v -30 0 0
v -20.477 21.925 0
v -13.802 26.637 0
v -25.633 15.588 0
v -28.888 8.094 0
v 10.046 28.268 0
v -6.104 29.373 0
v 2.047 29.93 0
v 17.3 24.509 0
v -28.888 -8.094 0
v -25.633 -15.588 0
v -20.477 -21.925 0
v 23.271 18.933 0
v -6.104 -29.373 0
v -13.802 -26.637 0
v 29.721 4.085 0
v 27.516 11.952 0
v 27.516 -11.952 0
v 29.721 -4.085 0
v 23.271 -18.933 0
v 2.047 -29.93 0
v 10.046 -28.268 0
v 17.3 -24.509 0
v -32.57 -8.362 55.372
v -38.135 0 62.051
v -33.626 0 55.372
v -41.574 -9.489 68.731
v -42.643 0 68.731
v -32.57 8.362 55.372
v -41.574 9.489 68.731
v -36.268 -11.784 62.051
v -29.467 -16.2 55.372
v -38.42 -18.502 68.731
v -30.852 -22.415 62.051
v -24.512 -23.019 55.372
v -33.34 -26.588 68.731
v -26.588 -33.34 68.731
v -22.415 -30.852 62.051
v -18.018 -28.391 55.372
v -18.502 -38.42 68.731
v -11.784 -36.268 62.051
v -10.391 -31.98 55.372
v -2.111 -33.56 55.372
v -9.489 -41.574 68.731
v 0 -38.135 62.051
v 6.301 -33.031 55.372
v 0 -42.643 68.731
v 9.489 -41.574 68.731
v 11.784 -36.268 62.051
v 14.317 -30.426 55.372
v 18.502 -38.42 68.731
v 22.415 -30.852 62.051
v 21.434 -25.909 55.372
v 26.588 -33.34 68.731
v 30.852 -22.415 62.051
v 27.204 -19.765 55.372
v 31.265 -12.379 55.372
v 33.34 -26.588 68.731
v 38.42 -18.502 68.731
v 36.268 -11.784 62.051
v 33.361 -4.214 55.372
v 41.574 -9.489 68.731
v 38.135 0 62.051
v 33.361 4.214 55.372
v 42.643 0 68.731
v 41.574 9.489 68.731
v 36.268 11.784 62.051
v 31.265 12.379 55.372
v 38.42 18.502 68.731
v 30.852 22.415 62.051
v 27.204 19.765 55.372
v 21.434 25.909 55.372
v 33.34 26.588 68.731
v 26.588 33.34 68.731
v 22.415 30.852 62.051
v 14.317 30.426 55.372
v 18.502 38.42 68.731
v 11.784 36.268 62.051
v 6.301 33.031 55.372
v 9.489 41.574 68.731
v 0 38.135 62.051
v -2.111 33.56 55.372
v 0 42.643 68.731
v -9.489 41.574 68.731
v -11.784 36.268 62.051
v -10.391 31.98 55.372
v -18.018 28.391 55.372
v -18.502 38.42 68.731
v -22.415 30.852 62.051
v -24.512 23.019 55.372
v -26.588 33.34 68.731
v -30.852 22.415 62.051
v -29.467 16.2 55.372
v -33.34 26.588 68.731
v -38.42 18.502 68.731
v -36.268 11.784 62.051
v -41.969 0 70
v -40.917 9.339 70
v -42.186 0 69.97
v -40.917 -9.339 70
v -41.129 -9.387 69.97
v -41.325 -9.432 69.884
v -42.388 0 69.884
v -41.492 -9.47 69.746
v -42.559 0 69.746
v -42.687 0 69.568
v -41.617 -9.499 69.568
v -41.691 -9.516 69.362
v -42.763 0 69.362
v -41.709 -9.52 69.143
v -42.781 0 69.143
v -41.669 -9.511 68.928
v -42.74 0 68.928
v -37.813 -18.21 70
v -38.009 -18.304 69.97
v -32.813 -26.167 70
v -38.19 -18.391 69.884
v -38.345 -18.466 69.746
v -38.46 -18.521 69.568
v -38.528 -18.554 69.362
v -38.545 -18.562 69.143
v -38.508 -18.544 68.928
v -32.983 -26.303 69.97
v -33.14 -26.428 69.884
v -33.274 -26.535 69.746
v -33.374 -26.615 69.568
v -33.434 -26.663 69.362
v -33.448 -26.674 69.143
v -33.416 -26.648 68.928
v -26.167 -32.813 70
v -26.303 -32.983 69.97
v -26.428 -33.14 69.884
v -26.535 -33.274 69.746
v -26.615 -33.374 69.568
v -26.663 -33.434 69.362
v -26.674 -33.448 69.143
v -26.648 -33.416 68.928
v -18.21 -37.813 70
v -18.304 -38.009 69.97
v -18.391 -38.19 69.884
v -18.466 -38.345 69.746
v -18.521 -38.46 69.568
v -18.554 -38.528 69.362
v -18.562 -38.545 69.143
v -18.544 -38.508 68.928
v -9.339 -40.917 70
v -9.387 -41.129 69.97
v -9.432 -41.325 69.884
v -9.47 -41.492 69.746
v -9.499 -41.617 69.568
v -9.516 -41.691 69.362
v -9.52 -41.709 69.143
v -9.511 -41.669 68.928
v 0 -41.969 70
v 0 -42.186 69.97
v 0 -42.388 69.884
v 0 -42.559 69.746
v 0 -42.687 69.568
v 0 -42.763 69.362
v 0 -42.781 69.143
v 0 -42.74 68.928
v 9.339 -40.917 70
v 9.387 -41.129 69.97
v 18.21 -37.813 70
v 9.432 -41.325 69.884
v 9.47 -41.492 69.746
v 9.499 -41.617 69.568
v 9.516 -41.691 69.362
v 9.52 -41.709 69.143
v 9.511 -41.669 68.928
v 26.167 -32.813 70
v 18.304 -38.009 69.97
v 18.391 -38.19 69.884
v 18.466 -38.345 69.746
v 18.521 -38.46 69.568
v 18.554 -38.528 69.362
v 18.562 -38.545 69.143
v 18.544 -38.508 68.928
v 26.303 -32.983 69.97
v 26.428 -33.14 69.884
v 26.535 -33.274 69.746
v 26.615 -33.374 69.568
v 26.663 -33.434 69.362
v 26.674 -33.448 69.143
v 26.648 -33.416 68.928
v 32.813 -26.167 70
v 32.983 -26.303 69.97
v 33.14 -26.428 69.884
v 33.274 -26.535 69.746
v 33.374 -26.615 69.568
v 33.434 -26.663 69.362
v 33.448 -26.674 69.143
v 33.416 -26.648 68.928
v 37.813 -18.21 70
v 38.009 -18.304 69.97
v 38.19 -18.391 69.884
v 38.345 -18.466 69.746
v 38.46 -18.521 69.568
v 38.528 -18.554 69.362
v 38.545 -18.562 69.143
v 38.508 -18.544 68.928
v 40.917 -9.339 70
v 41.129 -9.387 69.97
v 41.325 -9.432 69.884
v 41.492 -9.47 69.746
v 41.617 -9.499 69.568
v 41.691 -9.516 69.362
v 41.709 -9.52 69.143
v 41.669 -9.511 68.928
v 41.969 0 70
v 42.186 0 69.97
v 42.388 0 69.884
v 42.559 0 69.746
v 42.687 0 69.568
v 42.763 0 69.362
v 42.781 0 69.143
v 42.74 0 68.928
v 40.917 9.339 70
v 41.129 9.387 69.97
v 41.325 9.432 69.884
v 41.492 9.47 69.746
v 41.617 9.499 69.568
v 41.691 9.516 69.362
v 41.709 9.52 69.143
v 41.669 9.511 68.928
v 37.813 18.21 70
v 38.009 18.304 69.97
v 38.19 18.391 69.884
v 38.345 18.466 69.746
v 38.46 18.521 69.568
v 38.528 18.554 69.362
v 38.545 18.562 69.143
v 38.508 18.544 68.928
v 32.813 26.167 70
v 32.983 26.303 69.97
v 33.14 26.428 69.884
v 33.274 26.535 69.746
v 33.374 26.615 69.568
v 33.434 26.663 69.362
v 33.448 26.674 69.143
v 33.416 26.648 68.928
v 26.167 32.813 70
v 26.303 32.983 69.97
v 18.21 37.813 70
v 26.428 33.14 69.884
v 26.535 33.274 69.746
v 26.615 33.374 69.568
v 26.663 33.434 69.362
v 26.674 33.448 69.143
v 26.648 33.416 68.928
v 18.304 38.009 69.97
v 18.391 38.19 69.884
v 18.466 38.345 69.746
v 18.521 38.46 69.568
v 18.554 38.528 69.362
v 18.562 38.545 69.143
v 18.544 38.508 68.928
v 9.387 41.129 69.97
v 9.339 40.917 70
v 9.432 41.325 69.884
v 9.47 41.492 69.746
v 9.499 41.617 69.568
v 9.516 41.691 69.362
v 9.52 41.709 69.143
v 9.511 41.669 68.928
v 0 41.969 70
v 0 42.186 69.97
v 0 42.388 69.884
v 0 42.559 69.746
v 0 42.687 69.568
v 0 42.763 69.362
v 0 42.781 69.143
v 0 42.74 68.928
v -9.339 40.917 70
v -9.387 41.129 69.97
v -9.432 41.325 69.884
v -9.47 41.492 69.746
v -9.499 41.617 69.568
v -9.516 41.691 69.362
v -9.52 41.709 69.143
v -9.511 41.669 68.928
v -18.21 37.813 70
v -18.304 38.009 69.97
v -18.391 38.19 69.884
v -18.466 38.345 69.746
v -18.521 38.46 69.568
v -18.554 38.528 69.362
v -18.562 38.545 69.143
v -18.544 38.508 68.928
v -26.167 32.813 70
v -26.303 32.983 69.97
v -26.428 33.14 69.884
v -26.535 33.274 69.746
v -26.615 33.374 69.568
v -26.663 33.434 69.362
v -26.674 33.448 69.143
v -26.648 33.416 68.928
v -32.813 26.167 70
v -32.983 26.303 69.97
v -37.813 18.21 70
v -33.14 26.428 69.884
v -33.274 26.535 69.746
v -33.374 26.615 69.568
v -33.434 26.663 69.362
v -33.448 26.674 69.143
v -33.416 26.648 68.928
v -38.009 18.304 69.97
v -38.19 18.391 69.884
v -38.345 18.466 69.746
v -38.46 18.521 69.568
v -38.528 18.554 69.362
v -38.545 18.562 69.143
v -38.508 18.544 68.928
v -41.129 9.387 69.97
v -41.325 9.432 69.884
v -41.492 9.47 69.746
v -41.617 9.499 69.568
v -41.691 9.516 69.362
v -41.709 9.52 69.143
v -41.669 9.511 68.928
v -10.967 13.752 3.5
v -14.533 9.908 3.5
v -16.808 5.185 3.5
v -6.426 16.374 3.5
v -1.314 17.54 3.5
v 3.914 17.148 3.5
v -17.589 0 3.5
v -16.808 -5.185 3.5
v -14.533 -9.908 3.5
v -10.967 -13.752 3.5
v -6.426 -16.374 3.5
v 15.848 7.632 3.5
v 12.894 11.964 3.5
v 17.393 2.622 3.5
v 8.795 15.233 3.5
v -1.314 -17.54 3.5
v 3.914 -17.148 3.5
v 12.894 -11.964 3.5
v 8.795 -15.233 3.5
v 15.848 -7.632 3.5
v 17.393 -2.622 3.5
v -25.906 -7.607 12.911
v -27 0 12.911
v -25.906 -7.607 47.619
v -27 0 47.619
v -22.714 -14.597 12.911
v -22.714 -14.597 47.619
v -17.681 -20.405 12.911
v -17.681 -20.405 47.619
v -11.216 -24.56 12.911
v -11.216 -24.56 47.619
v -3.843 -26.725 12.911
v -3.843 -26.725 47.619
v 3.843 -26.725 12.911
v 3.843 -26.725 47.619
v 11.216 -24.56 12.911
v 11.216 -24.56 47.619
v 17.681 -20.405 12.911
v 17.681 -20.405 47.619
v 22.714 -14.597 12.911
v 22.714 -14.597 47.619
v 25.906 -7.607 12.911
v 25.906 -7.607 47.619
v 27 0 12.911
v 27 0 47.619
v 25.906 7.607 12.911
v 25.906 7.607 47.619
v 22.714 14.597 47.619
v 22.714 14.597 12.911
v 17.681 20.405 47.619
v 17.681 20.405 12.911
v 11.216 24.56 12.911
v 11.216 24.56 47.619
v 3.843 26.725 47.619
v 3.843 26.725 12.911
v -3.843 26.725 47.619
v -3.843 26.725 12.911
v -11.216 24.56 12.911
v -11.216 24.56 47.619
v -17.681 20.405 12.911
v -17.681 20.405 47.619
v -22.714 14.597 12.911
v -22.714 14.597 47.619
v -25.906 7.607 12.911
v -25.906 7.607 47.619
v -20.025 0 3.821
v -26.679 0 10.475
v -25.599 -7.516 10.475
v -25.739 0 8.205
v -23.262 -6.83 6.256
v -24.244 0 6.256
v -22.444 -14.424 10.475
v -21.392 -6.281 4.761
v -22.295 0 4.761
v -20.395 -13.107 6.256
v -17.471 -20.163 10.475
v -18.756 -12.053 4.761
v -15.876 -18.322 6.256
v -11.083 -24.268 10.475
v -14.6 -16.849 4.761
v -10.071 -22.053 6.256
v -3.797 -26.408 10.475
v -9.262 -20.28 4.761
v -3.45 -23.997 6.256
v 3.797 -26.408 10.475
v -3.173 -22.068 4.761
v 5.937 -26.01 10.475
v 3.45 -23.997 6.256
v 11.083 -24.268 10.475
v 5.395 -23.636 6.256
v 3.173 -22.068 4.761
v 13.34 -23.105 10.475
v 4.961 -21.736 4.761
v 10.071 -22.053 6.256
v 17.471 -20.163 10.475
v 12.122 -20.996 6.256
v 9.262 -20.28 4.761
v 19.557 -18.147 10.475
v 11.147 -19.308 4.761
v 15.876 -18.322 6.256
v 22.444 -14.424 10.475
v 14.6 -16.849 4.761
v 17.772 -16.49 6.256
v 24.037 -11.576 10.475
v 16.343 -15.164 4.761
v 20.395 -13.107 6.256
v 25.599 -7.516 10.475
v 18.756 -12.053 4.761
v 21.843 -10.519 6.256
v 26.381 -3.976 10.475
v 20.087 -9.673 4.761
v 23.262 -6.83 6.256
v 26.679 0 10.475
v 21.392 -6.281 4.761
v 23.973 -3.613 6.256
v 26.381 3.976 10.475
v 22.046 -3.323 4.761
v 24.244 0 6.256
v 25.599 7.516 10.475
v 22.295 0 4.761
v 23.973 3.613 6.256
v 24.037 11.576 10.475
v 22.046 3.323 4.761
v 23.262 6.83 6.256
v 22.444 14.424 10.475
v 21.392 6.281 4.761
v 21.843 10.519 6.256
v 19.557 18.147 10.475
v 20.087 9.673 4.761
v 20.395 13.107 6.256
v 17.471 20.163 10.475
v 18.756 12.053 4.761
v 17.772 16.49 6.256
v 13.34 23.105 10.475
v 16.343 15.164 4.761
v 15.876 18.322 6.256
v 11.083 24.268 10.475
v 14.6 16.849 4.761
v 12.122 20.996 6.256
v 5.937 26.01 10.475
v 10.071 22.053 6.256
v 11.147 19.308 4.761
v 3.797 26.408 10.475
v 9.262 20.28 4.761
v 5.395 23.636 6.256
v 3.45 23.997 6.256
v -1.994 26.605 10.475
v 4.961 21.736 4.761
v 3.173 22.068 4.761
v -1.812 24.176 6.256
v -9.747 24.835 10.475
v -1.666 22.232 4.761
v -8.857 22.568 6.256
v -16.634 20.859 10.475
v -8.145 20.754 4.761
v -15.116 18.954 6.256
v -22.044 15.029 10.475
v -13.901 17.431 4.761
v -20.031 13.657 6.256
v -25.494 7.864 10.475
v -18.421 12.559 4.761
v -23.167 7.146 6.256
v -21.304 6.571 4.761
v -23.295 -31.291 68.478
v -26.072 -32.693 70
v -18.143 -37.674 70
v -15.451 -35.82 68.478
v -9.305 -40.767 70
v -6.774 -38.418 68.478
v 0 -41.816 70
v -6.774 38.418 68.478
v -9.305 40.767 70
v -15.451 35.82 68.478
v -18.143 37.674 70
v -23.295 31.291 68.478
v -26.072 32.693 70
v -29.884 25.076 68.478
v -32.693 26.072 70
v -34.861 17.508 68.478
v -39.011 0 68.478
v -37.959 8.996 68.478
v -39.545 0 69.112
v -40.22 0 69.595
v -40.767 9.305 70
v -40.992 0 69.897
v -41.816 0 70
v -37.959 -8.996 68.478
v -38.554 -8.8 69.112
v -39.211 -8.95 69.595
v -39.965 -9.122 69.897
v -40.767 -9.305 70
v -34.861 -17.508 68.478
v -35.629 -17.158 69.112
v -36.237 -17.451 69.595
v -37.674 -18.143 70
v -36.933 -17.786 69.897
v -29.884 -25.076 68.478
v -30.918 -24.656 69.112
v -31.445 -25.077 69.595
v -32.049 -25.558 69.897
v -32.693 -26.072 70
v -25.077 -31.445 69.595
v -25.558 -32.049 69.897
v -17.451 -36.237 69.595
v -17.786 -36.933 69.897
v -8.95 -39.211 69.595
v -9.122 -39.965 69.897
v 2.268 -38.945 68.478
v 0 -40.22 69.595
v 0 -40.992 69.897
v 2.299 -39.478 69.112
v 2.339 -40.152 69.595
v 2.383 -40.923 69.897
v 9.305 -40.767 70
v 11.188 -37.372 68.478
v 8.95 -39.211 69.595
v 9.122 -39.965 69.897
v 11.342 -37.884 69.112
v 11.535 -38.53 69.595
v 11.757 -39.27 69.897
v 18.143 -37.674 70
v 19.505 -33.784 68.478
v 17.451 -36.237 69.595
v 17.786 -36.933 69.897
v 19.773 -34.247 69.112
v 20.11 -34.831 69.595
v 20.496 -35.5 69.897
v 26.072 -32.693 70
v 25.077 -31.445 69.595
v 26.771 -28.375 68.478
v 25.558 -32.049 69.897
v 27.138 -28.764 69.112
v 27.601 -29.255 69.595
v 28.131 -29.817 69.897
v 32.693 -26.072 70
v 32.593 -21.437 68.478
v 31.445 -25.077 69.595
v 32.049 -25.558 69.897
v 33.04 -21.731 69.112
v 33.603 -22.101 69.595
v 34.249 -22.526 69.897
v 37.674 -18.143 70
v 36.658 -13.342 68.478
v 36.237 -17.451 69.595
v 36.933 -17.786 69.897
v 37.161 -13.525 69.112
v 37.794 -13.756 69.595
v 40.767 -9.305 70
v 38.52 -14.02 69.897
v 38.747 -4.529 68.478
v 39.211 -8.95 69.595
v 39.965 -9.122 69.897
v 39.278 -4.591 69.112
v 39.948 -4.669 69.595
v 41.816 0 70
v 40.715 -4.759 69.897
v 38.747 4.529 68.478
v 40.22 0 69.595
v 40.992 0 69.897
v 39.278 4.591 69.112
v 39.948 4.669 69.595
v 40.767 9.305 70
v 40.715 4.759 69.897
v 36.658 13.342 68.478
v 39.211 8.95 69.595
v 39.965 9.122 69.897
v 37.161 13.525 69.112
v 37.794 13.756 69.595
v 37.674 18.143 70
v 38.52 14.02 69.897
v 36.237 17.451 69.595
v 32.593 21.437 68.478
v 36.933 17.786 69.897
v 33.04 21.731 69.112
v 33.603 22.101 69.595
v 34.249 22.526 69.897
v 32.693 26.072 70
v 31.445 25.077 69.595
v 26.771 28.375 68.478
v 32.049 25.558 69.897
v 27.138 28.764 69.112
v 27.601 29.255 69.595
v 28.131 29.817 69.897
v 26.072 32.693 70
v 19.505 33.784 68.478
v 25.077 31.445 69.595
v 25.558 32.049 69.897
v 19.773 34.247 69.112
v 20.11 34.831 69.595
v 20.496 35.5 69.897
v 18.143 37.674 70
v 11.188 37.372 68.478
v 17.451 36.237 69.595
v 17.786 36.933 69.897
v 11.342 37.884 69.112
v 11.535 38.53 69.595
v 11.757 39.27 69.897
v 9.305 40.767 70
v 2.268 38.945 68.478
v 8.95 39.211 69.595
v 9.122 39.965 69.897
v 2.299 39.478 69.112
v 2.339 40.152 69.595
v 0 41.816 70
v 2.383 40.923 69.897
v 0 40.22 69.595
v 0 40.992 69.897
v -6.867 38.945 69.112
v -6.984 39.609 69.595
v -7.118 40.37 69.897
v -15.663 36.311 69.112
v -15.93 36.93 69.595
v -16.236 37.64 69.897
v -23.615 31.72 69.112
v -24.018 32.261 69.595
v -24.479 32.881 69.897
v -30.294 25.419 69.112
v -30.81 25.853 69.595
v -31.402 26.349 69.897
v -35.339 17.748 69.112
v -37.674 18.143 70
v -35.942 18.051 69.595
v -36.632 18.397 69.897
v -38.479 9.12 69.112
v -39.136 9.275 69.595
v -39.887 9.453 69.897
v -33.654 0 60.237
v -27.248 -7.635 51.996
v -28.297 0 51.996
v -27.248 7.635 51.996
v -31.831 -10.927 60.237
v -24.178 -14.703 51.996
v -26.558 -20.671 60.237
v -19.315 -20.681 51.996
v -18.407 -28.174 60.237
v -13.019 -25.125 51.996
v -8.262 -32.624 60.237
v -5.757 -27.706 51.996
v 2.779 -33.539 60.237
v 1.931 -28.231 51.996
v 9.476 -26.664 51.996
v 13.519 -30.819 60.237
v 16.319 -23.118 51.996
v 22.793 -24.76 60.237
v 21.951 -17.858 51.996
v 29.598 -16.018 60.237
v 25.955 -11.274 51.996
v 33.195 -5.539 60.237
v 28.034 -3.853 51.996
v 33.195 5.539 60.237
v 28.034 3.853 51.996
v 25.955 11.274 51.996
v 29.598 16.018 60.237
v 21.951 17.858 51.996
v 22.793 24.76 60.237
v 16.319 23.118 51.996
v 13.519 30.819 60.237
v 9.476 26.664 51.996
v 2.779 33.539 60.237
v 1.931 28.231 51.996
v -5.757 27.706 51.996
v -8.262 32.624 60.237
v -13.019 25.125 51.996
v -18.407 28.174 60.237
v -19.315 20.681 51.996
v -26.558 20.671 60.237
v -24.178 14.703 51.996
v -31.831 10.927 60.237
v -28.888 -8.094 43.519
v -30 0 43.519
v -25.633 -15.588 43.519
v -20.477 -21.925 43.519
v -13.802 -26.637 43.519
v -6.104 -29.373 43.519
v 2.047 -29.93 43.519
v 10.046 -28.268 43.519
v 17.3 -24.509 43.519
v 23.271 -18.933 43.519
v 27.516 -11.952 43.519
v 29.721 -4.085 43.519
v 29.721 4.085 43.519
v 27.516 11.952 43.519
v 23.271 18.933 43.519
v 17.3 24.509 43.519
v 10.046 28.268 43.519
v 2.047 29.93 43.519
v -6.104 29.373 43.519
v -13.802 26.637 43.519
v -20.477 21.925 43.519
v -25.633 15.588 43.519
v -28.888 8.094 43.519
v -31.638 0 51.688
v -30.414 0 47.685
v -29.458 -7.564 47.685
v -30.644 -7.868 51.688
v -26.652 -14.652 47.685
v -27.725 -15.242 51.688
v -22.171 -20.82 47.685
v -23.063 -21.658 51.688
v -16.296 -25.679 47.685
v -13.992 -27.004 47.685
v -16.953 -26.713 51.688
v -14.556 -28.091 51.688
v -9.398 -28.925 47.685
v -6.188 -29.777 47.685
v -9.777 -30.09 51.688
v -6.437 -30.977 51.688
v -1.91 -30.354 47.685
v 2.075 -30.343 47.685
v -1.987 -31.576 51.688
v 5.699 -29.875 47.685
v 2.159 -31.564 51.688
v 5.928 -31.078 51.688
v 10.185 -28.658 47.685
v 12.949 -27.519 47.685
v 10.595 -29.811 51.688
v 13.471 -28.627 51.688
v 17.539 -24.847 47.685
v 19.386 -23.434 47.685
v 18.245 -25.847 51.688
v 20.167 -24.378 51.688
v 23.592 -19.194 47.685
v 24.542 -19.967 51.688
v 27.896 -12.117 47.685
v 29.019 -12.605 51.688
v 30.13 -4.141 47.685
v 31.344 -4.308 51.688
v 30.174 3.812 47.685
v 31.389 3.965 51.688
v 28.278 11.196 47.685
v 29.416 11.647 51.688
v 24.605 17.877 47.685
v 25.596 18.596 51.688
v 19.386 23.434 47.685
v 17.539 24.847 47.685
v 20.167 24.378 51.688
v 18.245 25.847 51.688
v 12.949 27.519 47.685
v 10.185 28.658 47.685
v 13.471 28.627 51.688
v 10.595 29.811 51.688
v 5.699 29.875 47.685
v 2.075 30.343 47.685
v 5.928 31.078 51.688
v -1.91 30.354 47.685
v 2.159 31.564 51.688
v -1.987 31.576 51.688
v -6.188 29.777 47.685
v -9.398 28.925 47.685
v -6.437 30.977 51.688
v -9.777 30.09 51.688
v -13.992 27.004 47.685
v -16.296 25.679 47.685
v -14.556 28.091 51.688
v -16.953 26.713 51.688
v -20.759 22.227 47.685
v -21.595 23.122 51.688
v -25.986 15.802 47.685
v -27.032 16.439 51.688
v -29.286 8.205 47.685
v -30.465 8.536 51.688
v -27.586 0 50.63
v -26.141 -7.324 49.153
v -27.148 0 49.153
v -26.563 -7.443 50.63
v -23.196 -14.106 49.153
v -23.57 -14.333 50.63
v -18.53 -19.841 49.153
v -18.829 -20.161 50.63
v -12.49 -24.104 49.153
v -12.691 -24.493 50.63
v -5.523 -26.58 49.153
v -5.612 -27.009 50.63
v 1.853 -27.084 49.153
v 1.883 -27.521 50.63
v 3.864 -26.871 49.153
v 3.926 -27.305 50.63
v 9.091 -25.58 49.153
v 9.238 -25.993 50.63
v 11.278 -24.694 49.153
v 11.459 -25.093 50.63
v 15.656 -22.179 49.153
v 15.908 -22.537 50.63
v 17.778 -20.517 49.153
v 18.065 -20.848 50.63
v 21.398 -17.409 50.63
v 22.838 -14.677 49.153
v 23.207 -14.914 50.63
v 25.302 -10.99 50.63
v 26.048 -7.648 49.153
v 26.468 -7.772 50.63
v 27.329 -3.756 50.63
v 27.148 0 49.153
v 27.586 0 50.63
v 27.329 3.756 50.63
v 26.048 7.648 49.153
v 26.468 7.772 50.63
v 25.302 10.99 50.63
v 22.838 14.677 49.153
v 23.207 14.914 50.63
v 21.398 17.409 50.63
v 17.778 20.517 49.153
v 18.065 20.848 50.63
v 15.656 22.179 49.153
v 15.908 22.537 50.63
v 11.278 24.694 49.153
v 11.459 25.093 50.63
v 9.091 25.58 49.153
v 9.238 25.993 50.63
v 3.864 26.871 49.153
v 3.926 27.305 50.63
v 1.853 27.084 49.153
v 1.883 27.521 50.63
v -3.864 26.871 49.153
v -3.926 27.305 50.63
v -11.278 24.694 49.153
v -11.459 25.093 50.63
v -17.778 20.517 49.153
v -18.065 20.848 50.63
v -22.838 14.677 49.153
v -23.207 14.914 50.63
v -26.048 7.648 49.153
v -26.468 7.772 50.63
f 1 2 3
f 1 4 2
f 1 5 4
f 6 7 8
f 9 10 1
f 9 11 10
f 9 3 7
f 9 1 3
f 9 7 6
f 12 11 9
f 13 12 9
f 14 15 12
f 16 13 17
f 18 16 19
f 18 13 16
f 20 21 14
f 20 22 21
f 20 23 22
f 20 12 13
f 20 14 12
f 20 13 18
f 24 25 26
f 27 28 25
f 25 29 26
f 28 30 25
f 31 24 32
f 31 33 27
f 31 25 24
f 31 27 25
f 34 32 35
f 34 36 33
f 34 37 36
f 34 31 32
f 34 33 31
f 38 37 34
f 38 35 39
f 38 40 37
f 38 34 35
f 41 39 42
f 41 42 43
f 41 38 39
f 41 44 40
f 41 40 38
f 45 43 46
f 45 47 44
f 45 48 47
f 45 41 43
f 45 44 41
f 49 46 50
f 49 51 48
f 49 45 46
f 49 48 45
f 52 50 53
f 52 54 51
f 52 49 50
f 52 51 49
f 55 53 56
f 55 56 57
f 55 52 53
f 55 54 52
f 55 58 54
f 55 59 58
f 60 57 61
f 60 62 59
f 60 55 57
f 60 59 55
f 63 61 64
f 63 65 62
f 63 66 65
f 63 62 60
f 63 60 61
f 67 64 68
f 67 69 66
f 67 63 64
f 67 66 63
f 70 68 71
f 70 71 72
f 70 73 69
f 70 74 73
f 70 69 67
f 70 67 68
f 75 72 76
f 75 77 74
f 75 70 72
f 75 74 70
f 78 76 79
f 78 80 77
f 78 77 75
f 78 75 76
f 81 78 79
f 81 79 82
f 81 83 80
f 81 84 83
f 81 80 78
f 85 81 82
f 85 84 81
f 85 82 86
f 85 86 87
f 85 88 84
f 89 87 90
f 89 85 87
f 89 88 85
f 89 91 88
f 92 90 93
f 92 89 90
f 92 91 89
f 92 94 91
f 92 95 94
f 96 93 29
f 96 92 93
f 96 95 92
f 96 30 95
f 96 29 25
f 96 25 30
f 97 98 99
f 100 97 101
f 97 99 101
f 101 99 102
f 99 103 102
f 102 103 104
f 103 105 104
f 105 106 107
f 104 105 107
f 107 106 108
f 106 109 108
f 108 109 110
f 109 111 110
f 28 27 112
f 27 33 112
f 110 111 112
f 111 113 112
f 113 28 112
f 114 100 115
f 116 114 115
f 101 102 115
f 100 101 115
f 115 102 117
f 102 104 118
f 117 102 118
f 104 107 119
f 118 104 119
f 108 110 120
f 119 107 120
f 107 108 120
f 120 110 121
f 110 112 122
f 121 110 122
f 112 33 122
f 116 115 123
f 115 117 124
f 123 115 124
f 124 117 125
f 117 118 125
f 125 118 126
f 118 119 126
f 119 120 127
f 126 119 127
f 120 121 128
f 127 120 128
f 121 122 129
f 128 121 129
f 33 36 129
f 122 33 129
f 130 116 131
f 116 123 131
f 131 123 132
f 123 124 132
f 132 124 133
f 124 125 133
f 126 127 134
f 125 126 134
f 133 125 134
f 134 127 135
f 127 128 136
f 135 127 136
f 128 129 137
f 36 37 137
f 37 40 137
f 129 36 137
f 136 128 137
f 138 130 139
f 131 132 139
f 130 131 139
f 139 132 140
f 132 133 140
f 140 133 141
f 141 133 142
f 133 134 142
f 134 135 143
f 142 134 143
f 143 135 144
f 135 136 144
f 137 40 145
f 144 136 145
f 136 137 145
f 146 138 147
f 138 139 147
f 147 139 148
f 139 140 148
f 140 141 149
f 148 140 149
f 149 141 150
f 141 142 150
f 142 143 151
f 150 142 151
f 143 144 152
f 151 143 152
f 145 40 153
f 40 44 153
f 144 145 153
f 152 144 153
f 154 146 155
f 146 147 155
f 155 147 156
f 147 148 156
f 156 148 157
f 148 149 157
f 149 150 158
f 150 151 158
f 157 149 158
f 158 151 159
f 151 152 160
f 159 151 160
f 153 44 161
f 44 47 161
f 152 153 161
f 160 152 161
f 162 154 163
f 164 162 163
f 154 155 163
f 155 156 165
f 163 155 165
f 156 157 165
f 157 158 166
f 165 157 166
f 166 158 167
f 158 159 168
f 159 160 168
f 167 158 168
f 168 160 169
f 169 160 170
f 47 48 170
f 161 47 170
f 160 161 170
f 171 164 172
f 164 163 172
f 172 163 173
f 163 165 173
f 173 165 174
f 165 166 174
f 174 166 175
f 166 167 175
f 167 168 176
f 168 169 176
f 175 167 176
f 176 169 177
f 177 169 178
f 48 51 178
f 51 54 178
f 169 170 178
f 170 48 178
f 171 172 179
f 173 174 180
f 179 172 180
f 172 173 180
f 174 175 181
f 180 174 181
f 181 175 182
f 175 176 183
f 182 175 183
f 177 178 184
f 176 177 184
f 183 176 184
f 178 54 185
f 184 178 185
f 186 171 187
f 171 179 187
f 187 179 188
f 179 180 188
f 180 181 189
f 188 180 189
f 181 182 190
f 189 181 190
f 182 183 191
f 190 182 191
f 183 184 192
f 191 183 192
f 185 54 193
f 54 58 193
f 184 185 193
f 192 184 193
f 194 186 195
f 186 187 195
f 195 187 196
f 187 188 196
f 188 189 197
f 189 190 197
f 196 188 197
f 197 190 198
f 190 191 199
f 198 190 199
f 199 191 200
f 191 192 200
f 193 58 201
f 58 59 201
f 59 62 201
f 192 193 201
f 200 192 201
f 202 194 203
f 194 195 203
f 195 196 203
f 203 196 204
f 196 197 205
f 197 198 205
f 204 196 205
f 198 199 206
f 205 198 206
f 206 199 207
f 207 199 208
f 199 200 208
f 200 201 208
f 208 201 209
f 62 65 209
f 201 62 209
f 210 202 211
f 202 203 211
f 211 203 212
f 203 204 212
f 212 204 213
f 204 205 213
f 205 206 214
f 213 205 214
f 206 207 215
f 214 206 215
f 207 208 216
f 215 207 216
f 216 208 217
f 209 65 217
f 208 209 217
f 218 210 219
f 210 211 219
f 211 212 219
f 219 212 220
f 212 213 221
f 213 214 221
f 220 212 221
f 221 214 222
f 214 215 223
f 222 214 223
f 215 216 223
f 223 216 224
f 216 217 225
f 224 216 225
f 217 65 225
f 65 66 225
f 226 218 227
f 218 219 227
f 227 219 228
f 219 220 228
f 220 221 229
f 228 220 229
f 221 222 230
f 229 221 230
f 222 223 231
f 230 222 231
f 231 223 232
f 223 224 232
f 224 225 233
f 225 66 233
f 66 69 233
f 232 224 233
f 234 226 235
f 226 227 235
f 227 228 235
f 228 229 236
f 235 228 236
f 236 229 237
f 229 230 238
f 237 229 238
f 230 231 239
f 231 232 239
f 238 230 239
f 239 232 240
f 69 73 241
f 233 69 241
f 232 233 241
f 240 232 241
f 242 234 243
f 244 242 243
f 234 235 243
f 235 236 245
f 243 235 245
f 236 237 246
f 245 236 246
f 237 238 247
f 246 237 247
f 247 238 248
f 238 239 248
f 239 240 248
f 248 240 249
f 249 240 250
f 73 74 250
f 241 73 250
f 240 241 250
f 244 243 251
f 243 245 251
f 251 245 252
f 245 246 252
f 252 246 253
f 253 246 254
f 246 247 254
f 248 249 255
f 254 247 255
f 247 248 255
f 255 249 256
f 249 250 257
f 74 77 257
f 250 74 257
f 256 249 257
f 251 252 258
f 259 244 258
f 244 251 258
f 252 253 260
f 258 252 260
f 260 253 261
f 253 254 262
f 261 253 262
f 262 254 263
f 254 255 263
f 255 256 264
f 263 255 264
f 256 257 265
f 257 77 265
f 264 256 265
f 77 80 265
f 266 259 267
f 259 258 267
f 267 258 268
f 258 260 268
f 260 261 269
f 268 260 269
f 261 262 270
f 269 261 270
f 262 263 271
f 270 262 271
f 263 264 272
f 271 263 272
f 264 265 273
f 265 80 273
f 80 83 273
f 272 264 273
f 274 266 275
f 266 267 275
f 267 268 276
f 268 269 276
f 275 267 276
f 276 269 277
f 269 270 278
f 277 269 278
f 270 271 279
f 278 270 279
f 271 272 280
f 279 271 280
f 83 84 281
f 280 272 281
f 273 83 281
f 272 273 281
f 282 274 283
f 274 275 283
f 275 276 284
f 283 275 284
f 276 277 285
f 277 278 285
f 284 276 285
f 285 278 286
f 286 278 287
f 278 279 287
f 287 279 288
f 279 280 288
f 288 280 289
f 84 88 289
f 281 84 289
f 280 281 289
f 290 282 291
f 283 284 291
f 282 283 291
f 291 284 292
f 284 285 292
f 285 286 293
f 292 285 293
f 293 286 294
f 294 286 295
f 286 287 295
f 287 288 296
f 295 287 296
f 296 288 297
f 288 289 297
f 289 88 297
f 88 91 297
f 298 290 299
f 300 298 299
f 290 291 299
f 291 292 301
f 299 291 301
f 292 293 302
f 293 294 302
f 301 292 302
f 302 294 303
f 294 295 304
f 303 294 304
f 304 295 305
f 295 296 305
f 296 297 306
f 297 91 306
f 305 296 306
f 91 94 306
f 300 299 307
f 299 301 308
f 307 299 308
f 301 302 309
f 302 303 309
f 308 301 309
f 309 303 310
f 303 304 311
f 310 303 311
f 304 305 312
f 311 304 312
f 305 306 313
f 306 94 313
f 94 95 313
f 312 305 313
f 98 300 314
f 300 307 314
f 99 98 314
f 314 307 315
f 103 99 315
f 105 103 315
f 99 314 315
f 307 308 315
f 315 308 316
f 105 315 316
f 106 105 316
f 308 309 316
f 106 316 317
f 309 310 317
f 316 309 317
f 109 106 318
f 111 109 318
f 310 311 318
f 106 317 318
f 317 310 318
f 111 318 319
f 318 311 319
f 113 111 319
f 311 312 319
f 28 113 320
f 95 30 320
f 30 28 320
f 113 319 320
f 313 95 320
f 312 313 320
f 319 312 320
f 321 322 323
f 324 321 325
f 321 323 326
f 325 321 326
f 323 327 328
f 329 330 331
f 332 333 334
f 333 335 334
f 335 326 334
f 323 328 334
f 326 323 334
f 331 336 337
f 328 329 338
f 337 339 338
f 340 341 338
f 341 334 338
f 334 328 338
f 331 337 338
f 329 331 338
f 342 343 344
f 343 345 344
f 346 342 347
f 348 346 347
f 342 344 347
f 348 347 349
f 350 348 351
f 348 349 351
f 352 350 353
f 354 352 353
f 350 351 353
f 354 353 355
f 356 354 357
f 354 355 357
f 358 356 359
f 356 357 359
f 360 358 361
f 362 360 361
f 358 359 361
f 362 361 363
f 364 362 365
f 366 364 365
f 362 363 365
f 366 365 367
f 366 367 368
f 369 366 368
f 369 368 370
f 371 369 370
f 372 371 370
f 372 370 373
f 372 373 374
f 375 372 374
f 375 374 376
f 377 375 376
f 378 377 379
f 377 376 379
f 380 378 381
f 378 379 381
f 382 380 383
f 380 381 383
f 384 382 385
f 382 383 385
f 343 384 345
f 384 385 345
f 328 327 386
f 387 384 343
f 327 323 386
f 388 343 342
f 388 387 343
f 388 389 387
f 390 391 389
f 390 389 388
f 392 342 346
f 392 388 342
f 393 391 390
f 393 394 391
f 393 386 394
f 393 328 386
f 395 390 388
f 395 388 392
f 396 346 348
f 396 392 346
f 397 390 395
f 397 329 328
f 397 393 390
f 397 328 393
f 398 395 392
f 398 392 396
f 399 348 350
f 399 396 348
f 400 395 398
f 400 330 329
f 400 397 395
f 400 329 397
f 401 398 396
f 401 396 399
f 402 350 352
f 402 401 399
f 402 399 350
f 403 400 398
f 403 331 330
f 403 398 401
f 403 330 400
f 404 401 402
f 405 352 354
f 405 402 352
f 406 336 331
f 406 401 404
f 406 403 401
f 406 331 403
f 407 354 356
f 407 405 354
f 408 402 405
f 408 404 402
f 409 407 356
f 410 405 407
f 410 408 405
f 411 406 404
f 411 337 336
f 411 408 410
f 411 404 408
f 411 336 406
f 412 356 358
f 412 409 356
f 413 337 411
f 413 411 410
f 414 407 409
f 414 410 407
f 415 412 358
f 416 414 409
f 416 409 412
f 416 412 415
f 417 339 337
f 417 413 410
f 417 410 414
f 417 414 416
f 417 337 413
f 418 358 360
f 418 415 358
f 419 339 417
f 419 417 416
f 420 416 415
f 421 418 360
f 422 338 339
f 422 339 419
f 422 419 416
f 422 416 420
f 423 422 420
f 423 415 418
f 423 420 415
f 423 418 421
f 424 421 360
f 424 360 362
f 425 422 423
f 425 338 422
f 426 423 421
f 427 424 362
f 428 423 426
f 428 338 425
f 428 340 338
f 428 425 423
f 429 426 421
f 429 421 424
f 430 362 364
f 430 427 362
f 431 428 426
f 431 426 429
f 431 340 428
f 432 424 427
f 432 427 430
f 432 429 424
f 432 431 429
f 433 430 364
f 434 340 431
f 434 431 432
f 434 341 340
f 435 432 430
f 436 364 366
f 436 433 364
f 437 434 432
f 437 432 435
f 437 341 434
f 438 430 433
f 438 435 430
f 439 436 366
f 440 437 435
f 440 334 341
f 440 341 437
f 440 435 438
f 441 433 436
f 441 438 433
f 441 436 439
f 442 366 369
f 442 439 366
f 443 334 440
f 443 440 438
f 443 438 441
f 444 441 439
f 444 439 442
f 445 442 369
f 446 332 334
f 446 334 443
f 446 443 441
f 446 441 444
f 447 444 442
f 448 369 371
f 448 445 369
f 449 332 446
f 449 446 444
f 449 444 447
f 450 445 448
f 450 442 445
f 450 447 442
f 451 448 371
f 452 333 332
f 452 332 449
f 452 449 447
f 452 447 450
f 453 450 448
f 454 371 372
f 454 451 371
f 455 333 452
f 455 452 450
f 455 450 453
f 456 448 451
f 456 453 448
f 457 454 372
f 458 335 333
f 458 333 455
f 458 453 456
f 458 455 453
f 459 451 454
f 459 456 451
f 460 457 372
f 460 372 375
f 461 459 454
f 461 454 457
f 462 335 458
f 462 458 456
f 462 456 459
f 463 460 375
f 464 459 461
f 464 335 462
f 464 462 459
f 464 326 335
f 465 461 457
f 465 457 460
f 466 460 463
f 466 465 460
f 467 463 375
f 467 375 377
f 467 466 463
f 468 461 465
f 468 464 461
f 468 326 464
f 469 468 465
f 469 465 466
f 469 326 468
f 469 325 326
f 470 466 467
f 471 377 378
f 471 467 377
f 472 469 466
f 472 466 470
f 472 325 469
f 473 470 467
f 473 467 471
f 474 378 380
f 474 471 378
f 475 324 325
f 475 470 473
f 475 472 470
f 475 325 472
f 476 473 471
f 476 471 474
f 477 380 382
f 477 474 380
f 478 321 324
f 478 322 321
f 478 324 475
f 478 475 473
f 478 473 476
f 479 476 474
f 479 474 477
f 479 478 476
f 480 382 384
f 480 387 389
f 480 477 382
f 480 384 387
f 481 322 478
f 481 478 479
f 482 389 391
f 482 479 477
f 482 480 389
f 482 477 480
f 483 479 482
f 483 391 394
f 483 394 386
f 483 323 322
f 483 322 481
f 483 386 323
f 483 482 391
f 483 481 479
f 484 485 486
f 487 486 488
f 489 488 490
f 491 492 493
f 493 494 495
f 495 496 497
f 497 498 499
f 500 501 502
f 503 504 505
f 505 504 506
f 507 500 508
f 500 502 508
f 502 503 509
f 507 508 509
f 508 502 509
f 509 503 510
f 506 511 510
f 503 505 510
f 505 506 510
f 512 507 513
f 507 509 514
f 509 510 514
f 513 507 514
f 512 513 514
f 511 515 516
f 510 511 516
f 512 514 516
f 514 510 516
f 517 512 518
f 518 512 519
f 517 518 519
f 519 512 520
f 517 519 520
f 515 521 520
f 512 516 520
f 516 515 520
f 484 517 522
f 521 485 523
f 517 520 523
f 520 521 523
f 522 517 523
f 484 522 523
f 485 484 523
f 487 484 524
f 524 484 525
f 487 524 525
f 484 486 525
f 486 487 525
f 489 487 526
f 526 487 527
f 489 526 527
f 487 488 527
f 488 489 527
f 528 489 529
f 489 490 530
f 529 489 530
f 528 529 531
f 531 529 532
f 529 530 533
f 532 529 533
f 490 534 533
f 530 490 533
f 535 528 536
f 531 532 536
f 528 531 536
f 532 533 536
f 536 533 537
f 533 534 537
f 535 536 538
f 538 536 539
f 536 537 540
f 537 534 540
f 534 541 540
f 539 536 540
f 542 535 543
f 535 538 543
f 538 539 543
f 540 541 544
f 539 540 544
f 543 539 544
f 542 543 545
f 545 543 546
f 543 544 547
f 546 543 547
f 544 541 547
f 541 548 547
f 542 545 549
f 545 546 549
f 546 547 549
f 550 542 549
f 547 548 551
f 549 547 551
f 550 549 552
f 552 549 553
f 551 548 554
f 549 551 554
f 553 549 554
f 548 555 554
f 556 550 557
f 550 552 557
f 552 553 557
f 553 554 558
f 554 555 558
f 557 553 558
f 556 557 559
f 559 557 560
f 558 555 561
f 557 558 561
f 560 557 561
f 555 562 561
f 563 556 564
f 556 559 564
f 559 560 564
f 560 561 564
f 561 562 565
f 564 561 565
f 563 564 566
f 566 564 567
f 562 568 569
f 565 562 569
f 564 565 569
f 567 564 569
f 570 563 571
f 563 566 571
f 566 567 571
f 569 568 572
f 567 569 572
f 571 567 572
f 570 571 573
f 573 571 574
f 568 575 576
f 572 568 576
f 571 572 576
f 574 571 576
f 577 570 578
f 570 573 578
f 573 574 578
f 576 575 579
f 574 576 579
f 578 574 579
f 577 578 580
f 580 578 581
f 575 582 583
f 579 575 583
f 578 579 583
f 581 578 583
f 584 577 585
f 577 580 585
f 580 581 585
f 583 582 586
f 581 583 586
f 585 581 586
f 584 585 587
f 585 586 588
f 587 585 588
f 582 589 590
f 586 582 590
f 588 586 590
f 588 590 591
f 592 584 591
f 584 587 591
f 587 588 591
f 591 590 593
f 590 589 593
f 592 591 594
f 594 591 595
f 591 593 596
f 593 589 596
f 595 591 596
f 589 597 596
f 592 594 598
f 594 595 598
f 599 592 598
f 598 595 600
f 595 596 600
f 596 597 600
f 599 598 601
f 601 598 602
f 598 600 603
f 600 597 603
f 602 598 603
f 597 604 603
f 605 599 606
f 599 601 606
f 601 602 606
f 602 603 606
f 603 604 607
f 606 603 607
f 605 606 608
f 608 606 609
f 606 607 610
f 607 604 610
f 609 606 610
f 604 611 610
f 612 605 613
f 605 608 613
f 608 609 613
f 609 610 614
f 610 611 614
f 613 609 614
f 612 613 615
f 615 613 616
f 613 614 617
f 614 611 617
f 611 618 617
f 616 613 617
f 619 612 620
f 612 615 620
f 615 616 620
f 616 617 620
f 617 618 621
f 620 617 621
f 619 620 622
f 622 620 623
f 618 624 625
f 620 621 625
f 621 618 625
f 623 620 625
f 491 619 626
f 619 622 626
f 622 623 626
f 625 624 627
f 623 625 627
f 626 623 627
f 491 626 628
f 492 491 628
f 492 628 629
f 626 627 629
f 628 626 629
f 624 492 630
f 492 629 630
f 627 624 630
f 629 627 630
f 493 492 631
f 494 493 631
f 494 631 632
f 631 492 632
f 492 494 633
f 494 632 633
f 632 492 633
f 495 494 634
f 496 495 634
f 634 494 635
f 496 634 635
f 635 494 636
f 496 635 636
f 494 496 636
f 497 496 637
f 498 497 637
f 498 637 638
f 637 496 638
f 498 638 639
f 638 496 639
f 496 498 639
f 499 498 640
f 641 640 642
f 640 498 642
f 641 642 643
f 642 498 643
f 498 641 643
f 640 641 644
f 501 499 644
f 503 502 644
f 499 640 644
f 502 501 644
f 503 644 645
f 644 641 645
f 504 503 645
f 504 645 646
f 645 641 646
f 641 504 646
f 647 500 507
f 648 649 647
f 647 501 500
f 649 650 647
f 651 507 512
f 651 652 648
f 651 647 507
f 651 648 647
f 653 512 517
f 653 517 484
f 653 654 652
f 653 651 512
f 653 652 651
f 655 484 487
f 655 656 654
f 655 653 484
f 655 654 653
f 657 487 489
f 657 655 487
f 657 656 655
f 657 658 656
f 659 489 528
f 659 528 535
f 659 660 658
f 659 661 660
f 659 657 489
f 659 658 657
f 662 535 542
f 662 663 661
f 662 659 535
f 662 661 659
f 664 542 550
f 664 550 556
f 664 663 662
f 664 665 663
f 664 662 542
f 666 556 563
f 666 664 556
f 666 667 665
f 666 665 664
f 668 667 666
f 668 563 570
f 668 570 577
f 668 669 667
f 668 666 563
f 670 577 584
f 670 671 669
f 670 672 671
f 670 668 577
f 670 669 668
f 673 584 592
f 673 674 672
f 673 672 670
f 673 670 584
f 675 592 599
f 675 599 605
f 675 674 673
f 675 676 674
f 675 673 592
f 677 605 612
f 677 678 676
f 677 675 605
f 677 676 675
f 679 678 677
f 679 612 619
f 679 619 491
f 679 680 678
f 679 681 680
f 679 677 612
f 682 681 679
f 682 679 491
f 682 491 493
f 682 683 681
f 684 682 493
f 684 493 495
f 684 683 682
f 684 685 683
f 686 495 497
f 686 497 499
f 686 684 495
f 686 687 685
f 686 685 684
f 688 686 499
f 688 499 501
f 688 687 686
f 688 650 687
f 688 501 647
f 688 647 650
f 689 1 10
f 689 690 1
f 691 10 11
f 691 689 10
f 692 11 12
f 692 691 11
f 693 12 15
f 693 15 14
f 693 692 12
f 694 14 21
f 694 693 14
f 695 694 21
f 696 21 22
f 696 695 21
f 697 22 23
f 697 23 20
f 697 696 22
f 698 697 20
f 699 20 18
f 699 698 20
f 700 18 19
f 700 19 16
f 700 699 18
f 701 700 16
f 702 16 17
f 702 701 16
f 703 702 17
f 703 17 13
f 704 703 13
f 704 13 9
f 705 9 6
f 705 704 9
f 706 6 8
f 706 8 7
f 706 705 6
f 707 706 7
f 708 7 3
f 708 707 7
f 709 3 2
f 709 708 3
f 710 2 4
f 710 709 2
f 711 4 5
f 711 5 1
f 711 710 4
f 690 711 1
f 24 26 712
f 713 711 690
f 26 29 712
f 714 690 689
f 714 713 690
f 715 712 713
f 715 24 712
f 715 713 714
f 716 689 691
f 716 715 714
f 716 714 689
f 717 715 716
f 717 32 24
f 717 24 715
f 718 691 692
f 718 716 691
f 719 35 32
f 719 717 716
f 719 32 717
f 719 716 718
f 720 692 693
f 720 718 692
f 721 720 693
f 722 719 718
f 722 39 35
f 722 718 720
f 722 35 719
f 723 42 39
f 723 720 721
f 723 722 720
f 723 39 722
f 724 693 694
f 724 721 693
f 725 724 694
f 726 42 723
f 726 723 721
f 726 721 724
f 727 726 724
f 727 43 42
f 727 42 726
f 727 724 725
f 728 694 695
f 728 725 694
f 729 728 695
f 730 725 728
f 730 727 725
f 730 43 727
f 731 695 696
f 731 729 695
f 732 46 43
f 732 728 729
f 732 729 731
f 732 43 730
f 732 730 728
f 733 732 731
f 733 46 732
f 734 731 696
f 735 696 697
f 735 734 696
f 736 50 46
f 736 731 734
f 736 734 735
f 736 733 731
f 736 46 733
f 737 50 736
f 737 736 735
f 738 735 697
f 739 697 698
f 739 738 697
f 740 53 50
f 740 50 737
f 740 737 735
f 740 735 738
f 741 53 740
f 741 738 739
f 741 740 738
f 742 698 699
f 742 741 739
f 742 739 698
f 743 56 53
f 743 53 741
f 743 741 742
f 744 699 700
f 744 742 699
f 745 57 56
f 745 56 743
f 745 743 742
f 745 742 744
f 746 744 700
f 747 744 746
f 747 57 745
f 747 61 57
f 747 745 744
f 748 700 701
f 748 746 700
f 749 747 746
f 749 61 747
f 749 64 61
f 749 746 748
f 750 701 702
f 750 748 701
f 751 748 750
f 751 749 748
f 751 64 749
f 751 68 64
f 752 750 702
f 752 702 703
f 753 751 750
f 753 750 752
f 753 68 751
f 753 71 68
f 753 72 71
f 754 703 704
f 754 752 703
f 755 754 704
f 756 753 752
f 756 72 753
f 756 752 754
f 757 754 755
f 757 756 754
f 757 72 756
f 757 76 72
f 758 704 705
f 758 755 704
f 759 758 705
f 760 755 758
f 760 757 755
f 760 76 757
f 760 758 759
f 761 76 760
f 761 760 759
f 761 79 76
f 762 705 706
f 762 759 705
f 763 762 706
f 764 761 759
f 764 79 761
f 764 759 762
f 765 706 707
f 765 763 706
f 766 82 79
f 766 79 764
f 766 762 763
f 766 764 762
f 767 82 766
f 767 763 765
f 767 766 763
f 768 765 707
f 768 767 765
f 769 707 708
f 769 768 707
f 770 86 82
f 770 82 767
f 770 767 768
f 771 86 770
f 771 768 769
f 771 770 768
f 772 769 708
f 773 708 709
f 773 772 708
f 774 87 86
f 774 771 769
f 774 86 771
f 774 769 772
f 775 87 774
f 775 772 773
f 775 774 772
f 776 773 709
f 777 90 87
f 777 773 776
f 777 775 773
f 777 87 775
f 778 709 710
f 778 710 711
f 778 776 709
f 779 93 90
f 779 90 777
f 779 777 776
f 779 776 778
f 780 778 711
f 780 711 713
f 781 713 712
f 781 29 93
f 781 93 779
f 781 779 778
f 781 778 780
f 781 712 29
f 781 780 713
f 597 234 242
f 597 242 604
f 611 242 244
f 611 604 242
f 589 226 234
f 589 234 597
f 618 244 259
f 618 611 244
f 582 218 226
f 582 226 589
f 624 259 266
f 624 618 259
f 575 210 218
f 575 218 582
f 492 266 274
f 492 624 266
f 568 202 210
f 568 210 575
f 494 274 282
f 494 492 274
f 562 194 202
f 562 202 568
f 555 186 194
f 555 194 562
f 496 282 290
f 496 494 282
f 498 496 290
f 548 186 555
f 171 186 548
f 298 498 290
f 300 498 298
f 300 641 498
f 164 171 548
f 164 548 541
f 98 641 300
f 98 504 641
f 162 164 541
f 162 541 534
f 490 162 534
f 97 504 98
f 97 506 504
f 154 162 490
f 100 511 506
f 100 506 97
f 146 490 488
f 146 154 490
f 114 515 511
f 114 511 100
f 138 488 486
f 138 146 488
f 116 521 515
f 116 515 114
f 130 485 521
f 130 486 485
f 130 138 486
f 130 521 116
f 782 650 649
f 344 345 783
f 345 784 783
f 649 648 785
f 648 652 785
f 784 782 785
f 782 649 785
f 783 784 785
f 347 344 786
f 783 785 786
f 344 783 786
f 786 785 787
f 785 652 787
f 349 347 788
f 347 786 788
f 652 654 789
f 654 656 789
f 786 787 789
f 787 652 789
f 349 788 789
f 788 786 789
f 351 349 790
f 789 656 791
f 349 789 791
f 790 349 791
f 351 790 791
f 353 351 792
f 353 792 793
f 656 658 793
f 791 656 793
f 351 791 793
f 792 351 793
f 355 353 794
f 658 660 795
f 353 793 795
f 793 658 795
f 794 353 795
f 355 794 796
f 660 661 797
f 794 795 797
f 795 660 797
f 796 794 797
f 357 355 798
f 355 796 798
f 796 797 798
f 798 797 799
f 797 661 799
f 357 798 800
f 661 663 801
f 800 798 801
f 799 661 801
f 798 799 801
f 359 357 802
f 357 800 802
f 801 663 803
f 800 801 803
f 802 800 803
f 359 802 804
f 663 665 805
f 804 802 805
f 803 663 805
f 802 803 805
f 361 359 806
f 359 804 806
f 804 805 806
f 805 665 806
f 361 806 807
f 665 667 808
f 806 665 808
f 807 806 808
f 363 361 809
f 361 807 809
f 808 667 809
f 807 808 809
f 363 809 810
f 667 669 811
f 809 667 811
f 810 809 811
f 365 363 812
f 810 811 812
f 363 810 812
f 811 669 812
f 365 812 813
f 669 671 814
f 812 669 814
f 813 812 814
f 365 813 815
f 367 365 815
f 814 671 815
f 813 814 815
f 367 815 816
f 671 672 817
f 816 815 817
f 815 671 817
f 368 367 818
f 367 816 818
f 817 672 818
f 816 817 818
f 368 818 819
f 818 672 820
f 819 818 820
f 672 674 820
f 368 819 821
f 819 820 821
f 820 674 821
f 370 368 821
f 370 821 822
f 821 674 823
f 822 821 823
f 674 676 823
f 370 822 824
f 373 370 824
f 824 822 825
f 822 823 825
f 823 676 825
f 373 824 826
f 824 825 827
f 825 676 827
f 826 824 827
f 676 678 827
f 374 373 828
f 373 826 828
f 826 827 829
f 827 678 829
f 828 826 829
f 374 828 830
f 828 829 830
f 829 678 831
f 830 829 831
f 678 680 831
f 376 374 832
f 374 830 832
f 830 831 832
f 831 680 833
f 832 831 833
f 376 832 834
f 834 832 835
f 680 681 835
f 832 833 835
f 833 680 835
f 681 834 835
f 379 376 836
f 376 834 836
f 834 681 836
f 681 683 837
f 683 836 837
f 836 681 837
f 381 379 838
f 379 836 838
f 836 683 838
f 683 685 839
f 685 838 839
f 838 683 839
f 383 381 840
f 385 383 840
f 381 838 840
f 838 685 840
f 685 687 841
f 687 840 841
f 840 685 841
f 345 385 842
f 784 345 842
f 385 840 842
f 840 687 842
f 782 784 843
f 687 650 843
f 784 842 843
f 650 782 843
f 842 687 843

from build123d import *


with BuildPart() as part:
    # Sketch → Revolution (revolve)
    with BuildSketch(Plane.XZ):
        with BuildLine():
            Line((0, 0), (-30, 0))
            Line((-30, 0), (-30, 43.518658))
            ThreePointArc((-30, 43.518658), (-30.926805, 49.716476), (-33.626135, 55.372051))
            Line((-33.626135, 55.372051), (-42.643328, 68.730856))
            ThreePointArc((-41.968787, 70), (-42.687419, 69.568119), (-42.643328, 68.730856))
            Line((-41.968787, 70), (-41.81553, 70))
            ThreePointArc((-39.010557, 68.47778), (-40.219831, 69.594921), (-41.81553, 70))
            Line((-39.010557, 68.47778), (-28.297456, 51.996087))
            ThreePointArc((-27, 47.619295), (-27.331193, 49.901821), (-28.297456, 51.996087))
            Line((-27, 12.91057), (-27, 47.619295))
            ThreePointArc((-27, 12.91057), (-24.243708, 6.256292), (-17.58943, 3.5))
            Line((0, 3.5), (-17.58943, 3.5))
            Line((0, 0), (0, 3.5))
        make_face()
    revolve(axis=Axis((0, 0, 0), (0, 0, 1)))


solid = part.part
